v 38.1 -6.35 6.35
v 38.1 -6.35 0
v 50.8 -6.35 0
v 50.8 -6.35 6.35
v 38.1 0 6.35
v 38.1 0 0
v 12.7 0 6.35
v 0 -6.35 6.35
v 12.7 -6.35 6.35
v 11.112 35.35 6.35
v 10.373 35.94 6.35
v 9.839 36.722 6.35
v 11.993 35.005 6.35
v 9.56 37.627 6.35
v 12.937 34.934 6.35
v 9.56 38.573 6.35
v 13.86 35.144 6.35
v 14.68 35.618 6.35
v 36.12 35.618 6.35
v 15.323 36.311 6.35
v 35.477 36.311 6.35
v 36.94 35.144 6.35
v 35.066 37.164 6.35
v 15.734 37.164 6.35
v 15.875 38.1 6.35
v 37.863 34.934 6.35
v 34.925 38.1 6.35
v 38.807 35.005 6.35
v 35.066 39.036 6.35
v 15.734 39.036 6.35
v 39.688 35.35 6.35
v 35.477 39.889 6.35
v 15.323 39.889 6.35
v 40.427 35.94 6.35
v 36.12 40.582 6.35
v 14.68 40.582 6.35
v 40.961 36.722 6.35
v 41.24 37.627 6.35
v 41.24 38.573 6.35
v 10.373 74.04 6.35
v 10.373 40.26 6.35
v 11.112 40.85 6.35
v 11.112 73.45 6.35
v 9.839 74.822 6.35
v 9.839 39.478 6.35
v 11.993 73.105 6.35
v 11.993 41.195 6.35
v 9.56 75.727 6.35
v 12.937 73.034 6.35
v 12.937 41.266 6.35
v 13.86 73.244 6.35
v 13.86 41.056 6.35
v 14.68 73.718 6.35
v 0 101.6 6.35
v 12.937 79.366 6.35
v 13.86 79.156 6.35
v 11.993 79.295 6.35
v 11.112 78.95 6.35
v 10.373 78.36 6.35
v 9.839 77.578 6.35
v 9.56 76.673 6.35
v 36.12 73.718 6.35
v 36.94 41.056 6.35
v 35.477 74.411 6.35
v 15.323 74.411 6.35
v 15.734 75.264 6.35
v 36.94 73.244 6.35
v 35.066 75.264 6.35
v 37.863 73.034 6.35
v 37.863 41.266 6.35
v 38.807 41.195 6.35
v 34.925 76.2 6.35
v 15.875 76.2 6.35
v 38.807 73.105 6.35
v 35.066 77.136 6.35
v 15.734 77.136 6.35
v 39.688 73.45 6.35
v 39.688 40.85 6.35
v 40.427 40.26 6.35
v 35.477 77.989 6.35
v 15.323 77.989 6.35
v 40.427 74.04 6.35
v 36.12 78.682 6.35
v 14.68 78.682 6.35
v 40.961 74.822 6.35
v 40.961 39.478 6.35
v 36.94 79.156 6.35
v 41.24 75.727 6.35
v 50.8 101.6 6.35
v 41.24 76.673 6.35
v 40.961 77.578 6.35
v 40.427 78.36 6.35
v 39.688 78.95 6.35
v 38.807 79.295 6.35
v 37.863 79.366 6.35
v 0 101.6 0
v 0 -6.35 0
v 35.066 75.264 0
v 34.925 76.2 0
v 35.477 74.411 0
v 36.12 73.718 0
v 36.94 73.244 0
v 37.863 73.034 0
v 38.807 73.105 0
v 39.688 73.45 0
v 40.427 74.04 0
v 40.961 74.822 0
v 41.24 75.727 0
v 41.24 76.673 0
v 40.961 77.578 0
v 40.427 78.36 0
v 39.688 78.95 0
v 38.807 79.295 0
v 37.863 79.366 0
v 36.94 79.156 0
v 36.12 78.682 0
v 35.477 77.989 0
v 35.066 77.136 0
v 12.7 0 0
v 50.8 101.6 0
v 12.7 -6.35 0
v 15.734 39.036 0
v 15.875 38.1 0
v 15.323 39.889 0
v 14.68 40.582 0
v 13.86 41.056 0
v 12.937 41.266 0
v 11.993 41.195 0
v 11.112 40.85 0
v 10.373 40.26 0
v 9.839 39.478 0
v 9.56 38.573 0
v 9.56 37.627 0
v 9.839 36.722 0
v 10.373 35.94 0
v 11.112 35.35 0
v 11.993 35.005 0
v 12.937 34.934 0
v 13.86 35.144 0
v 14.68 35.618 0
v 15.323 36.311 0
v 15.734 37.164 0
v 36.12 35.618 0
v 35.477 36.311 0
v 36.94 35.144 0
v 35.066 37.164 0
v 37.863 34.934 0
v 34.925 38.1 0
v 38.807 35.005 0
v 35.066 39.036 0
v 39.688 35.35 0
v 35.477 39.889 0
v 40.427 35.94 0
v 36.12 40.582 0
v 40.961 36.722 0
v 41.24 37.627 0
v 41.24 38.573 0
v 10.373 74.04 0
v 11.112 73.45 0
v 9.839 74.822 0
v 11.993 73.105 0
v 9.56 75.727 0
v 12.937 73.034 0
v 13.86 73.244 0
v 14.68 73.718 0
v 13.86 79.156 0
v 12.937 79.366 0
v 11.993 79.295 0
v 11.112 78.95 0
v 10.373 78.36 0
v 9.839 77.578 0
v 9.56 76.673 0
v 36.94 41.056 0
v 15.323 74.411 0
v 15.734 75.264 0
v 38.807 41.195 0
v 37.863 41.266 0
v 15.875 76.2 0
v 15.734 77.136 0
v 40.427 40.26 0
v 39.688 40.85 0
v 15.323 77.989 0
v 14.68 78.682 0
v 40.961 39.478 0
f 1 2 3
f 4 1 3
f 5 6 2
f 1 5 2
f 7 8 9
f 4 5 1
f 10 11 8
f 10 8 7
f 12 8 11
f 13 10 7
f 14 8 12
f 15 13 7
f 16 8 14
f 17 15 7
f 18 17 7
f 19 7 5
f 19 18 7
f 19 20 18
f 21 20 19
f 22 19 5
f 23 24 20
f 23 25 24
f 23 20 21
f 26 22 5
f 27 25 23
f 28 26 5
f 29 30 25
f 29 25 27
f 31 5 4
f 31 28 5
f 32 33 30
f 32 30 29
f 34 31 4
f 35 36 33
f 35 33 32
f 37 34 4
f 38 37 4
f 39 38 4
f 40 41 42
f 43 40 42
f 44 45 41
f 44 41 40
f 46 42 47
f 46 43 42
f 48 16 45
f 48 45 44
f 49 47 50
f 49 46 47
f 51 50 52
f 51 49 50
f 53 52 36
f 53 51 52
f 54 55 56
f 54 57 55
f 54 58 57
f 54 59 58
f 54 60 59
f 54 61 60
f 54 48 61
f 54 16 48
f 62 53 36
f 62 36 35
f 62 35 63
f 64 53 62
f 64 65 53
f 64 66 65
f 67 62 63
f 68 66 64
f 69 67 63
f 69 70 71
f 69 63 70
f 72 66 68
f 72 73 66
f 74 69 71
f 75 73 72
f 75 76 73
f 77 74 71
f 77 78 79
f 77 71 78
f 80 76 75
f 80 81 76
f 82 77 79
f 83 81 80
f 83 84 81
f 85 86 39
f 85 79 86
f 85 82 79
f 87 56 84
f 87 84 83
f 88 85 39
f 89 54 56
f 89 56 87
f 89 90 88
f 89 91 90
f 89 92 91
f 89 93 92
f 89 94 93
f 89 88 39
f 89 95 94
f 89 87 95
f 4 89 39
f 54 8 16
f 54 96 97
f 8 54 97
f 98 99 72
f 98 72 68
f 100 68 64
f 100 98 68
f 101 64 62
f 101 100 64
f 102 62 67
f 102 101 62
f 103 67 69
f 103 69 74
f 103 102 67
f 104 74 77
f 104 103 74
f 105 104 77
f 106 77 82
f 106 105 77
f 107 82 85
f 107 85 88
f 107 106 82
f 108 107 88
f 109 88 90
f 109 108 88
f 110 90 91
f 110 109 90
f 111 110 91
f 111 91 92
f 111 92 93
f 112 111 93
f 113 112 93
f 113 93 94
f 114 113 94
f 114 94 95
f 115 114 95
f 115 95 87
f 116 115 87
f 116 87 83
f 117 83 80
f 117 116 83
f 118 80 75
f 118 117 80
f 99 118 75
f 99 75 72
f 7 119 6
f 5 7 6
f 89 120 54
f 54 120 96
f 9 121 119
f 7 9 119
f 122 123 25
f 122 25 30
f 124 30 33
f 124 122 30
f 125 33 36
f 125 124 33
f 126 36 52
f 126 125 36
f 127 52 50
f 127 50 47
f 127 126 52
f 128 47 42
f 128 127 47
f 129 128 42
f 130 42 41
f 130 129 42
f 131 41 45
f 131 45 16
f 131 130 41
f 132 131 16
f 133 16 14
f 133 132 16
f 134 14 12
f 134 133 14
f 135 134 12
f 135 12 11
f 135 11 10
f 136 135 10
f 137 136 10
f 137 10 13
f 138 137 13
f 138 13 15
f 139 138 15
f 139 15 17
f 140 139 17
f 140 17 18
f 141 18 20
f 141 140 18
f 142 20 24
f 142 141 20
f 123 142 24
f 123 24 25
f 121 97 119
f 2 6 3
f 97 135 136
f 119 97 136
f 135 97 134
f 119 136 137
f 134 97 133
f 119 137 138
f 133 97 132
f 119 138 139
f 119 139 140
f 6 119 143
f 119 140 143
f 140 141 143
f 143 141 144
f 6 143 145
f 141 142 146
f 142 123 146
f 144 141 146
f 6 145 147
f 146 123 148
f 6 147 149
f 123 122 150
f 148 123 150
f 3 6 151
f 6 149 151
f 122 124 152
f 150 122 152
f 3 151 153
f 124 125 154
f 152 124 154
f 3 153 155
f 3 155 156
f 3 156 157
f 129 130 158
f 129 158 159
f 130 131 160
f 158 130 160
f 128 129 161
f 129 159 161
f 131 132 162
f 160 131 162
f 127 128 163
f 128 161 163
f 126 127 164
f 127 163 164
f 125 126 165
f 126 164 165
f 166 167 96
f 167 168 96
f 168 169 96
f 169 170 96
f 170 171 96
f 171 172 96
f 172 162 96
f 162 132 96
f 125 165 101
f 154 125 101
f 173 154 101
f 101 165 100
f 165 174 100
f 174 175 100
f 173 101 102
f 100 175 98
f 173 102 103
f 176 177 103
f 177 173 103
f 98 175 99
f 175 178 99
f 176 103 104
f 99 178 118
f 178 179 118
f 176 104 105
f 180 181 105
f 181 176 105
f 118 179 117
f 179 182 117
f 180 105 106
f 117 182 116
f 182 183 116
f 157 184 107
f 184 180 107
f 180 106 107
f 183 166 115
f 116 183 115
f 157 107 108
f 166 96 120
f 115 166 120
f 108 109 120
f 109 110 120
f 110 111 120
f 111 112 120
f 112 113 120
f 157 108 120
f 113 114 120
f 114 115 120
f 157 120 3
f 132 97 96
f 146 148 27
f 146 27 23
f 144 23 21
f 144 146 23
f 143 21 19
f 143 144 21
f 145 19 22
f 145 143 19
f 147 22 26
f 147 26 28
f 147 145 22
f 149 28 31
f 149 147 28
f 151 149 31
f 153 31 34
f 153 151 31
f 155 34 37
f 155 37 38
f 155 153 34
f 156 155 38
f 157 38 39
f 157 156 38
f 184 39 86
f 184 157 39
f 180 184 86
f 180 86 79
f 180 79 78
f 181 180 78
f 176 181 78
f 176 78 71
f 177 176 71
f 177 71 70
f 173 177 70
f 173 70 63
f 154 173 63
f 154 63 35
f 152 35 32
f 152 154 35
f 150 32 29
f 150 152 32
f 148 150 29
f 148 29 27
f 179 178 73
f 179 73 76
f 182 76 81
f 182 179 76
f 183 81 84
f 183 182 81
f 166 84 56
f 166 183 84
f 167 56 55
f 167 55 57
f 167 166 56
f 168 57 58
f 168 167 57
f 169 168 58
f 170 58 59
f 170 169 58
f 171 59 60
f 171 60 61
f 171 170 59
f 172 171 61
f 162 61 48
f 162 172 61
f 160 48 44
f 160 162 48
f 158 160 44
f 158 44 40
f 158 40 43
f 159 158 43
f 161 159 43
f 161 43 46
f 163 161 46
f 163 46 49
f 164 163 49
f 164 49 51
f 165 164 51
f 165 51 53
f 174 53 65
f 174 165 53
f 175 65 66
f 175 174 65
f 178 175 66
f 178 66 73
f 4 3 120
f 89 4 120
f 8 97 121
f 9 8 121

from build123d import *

# Parameters (mm, degrees)
SKETCH1_R           = 3.175
BOSS_EXTRUDE1_DEPTH = 6.35


with BuildPart() as part:
    # Sketch1 → Boss-Extrude1 (new body)
    with BuildSketch(Plane.XY):
        Polygon((12.7, 0), (38.1, 0), (38.1, -6.35), (50.8, -6.35), (50.8, 0), (50.8, 101.6), (0, 101.6), (0, 0), (0, -6.35), (12.7, -6.35), align=None)
        with Locations((12.7, 76.2)):
            Circle(SKETCH1_R, mode=Mode.SUBTRACT)
        with Locations(Location((38.1, 76.2, 0), (0, 0, 180))):
            Circle(SKETCH1_R, mode=Mode.SUBTRACT)
        with Locations((12.7, 38.1)):
            Circle(SKETCH1_R, mode=Mode.SUBTRACT)
        with Locations(Location((38.1, 38.1, 0), (0, 0, 180))):
            Circle(SKETCH1_R, mode=Mode.SUBTRACT)
    extrude(amount=BOSS_EXTRUDE1_DEPTH)


solid = part.part
